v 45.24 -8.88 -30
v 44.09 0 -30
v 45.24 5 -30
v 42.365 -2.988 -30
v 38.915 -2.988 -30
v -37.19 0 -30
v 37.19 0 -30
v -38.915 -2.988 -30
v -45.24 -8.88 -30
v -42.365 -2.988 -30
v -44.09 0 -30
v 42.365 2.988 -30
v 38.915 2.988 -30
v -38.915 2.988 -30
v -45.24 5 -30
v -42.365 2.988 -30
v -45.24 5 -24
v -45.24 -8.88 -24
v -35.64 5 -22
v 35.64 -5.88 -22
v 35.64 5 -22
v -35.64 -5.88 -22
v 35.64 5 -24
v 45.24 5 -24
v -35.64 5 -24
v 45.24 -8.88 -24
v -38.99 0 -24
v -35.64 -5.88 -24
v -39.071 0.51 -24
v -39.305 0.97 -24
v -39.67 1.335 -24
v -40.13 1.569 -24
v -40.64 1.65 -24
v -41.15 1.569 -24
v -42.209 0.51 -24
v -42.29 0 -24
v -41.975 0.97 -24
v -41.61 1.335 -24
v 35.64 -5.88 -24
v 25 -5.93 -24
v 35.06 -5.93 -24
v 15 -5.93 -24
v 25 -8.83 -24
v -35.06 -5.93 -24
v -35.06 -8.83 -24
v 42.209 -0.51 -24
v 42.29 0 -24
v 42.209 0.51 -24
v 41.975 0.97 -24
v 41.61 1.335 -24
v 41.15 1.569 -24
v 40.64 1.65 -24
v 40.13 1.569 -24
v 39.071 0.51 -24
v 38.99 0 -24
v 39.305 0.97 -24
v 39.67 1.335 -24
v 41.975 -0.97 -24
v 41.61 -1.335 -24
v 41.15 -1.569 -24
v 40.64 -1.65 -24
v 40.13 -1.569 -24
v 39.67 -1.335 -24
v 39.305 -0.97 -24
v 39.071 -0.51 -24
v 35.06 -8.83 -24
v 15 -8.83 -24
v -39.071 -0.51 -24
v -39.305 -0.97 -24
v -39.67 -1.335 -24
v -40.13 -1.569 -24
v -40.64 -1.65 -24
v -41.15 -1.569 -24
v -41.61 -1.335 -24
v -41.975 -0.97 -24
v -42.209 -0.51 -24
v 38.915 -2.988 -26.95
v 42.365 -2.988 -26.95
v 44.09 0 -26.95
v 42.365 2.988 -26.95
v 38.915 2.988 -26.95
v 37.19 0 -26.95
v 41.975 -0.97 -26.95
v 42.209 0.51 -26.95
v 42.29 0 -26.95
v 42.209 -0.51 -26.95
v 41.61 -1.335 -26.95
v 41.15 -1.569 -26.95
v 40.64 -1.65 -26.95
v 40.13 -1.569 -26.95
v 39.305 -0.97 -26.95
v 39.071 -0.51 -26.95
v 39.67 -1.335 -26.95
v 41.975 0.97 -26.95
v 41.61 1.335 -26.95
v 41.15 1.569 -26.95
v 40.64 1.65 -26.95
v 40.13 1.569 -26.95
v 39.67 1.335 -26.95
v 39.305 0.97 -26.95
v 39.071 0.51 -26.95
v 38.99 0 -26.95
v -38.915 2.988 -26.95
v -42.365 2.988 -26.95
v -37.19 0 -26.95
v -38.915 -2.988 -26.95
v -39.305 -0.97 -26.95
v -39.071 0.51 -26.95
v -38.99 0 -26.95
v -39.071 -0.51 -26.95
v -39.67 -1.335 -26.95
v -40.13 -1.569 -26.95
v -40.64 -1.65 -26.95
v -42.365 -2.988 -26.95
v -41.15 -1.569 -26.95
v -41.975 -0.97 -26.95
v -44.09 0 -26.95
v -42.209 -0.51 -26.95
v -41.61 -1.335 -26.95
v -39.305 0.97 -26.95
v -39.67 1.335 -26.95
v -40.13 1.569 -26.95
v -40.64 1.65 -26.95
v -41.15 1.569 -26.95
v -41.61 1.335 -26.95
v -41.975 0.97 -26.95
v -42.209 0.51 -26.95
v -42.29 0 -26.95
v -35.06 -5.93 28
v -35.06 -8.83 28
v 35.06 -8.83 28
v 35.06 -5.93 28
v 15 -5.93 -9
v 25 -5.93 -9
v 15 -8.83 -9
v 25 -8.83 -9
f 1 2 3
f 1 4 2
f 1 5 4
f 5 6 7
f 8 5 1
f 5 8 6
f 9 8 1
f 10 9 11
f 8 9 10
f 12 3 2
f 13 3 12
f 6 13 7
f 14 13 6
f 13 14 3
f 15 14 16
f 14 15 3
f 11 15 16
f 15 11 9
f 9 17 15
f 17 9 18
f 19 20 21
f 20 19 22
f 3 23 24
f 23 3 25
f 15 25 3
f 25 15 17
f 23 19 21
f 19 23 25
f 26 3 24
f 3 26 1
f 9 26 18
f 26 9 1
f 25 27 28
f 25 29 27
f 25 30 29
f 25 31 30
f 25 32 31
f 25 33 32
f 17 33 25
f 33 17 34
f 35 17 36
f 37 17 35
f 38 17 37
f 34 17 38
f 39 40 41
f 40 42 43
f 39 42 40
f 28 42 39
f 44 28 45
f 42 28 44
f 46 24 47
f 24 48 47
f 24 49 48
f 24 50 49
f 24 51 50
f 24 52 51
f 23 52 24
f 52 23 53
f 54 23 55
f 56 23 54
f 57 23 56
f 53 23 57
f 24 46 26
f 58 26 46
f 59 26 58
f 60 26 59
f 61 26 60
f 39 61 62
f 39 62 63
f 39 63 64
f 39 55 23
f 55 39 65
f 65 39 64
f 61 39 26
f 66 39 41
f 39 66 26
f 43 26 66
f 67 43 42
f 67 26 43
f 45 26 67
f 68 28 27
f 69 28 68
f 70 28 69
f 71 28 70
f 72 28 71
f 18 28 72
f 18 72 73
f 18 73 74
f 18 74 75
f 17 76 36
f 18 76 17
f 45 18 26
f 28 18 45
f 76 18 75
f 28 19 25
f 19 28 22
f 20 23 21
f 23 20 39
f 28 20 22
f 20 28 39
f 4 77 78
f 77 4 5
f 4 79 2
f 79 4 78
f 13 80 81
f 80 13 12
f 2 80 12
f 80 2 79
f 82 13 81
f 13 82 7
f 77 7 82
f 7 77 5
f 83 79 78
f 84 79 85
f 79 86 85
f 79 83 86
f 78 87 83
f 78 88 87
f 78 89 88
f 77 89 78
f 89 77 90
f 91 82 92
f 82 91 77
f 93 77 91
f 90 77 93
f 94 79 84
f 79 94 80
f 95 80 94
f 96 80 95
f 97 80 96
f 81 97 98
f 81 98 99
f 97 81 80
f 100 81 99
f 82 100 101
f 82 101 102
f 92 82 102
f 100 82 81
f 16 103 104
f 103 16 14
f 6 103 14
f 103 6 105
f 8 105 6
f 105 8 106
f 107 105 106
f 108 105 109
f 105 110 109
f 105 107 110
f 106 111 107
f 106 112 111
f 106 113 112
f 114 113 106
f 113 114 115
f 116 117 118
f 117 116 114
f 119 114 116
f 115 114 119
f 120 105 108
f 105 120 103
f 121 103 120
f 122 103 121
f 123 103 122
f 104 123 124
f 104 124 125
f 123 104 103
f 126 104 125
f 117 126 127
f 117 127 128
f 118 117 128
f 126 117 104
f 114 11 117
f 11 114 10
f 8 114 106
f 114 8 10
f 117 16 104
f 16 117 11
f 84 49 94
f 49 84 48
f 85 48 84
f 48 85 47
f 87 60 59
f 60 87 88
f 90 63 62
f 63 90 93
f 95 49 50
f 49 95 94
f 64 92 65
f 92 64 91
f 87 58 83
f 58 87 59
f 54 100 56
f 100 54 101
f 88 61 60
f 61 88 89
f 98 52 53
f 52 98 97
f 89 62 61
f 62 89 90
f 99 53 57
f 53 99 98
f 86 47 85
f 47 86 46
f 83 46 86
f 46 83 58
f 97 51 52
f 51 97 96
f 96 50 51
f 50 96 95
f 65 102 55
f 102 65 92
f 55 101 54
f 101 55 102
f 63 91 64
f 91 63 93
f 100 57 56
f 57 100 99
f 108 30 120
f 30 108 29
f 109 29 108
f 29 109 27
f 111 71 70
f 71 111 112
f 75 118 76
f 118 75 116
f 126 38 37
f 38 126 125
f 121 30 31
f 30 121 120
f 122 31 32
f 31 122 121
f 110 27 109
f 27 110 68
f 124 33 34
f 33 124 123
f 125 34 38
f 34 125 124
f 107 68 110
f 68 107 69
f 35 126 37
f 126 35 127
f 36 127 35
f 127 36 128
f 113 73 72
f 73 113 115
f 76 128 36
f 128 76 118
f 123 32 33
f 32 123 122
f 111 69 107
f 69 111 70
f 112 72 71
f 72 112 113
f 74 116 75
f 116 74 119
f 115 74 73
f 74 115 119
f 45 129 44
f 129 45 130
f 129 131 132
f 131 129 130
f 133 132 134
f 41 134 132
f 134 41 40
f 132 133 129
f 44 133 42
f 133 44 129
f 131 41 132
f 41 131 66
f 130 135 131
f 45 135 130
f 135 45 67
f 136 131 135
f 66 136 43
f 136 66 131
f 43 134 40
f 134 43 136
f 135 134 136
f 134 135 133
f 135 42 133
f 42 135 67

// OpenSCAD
// file: configuration.scad
//ALBASE1115
//------------------------------------------------------------
///*
vzdalenost_der = 10.16; //rozteč děr mezi sebou
radidus_hrany = 5; //radius zaobleni sloupku

//parametry lišty
vzdalenost_od_okraje = 8.88; //vzdalenost stredu upevnovaci diry od kraje desky

//mala hrana
pocet_der1 = 8; //pocet der desky, ponížené o 3

//velka hrana
pocet_der2 = 8; //pocet der desky, ponížené o 3
//*/


//OBECNE PARAMETRY KRABICKY
//------------------------------------------------------------
vyska = 60;  //vyska celeho sloupku, pro zjisteni celkove vysky krabicky je potreba k teto vysce pricist tloustku 2xALBASE, nebo 2xPLBASE

//PLBASE PARAMETRY
//------------------------------------------------------------
tloustka_plbase = 2; //tloustka plbase
prekryti_der=0.3; //sila materiálu, který překrývá díry

//PRIPADNA VYSKA NOZICEK
//------------------------------------------------------------
vyska_nozicky=5;
// file: configuration/manufactury_conf.scad
$fn=20; // model faces resolution.

//Sloupek - vyrobni parametry
zapust=6; //zápust ve sloupku pro listu
tolerance=0.5; //tolerance mezi zapusti v sloupku  a v listě
zapust1=zapust+tolerance;

//Sroub - parametry
vyska_hlavy = 3.5;
prumer_hlavy=6;
prumer_sroubu=3.3;

//Matice - parametry
vyska_matky=3;
sirka_matky=6.7;

prumer_matice=6; //hrany k hraně
vyska_matice=3;  //vyska matice
posuv_dorazu=0;  //pro moznost posuvu dorazu pro vsunutí matice
matice_sila_materialu=2; //sila materialu pod maticí na ose z


//Lišta parametry
//---------------------------------------------------
//rozměry výrezu v ose y
vzdalenost_od_diry = 5; //vzdalenost od stredu upevnovaci diry na druhou stranu

//rozmery vyrezu v ose x
vzdalenost_1 = 4.6; //od díry ke kraji
vzdalenost_2 = 5;

vyska_listy=2; //definuje výšku žlábku do kterého se vsunuje čelíčko

//parametry pro úžlabinu
sirka_materialu = 0; //sirka materialu od kraje desky k uzlabine


//Celicko
//--------------------------------------------------
vule_vysky_celicka =0; //definuje vůli celicka v liste
vule_delky_celicka =1;
tloustka_celicka = 3;
vule_tlousky = 0.1;
// file: uravena_celicka.scad
use <configuration/celicko.scad>
use <configuration/sloupek.scad>
use <configuration/lista.scad>

include <configuration.scad>
include <configuration/manufactury_conf.scad>

//Slouzi pro vytvoreni vlastnich celicek dle potreby

//Vytvoreni predniho celicka krabicky
//--------------------------------------------------------
module celicko_predni()
{
translate([0,0,0])
difference() {
celicko (vyska,zapust,vule_vysky_celicka,pocet_der2,vzdalenost_der,vule_delky_celicka,tloustka_celicka,vule_tlousky,vyska_listy);
    
translate([20,0,0])
cube(size = [10,10,30], center = true);    
    
              }
}



//Vytvoreni zadniho celicka krabicky
//--------------------------------------------------------
module celicko_zadni()
{
translate([0,0,0])
difference() {
celicko (vyska,zapust,vule_vysky_celicka,pocet_der2,vzdalenost_der,vule_delky_celicka,tloustka_celicka,vule_tlousky,vyska_listy);
    
translate([20,0,0])    
cube(size = [10,10,30], center = true); 
}
}


//Vytvoreni leveho celicka krabicky
//--------------------------------------------------------
module celicko_leve()
{
translate([0,0,0])
difference() {
celicko (vyska,zapust,vule_vysky_celicka,pocet_der1,vzdalenost_der,vule_delky_celicka,tloustka_celicka,vule_tlousky,vyska_listy);
       
translate([20,0,0])    
cube(size = [10,10,30], center = true); 
}
}



//Vytvoreni praveho celicka krabicky
//--------------------------------------------------------
module celicko_prave()
{
translate([0,0,0])
difference() {
celicko (vyska,zapust,vule_vysky_celicka,pocet_der1,vzdalenost_der,vule_delky_celicka,tloustka_celicka,vule_tlousky,vyska_listy);
       
translate([20,0,0])    
cube(size = [10,10,30], center = true); 
}
}
barva_predni = "cyan";
barva_zadni = "red";
barva_leve = "green";
barva_prave = "yellow";

//Zobrazeni vzhledu navrhovanych celicek
color(barva_predni)
translate([0,-50,0]) 
celicko_predni();

color(barva_zadni)
translate([0,50,0])
rotate(a=[0,0,180])
celicko_zadni();

color(barva_leve)
translate([-60,0,0])
rotate(a=[0,0,270])
celicko_leve();

color(barva_prave)
translate([60,0,0])
rotate(a=[0,0,90])
celicko_prave();
// file: configuration/plbase.scad
/*
pocet_der1=5;
pocet_der2=3;
radidus_hrany=5;
vzdalenost_der=10.16;
vzdalenost_od_okraje=8.8;
prumer_sroubu=3.3;

tloustka_plbase=2;
prekryti_der=0.3;

vyska_nozicky=5;

vyska_hlavy = 3.5;
prumer_hlavy=6;
*/

//PLBASE ZAKLADNI
//------------------------------------------------------------
module plbase(pocet_der1,pocet_der2,radidus_hrany,vzdalenost_der,vzdalenost_od_okraje,prumer_sroubu,tloustka_plbase,prekryti_der){

difference () {
//union () {
translate([radidus_hrany,radidus_hrany,0])
minkowski()
    {
	cube([(pocet_der1-1)*vzdalenost_der+2*vzdalenost_od_okraje-2*radidus_hrany,(pocet_der2-1)*vzdalenost_der+2*vzdalenost_od_okraje-2*radidus_hrany,tloustka_plbase]);          // base plastics brick
        cylinder(r=radidus_hrany,h=0.1);
    }
    

for (i = [0:1:pocet_der1-1]) {
      for (a = [0:1:pocet_der2-1]) {  
          
    translate([vzdalenost_od_okraje+vzdalenost_der*i,vzdalenost_od_okraje+vzdalenost_der*a, (tloustka_plbase-prekryti_der)/2])  // center top screw
        cylinder(((tloustka_plbase-prekryti_der)), d=prumer_sroubu, center=true); 
      }
      }
 
translate([vzdalenost_od_okraje,vzdalenost_od_okraje, (tloustka_plbase/2)])  // center top screw
        cylinder(((tloustka_plbase+0.3)), d=prumer_sroubu, center=true);  
      
translate([vzdalenost_od_okraje+(pocet_der1-1)*vzdalenost_der,vzdalenost_od_okraje, (tloustka_plbase/2)])  // center top screw
        cylinder(((tloustka_plbase+0.3)), d=prumer_sroubu, center=true);  

translate([vzdalenost_od_okraje+(pocet_der1-1)*vzdalenost_der,vzdalenost_od_okraje+(pocet_der2-1)*vzdalenost_der, (tloustka_plbase/2)])  // center top screw
        cylinder(((tloustka_plbase+0.3)), d=prumer_sroubu, center=true); 
      
translate([vzdalenost_od_okraje,vzdalenost_od_okraje+(pocet_der2-1)*vzdalenost_der, (tloustka_plbase/2)])  // center top screw
        cylinder(((tloustka_plbase+0.3)), d=prumer_sroubu, center=true);       
      
}
}



//MODEL NOZICKY PRO PLBASE
//-----------------------------------------------------------
//průmer nozicky je roven vzdalenost_der
module nozicka (vzdalenost_der,vyska_nozicky,prumer_sroubu,vyska_hlavy,prumer_hlavy)
{
    difference () {
translate([0,0,-vyska_nozicky/2]) 
cylinder((vyska_nozicky), d=vzdalenost_der, center=true); 
translate([0,0,-(vyska_nozicky-vyska_hlavy/2)])       
cylinder((vyska_hlavy), d=prumer_hlavy, center=true); 
translate([0,0,-vyska_nozicky/2]) 
cylinder((vyska_nozicky), d=prumer_sroubu, center=true);       
}
}



//PLBASE S NOZICKAMA
//-----------------------------------------------------------
module plbase_s_nozickama(pocet_der1,pocet_der2,radidus_hrany,vzdalenost_der,vzdalenost_od_okraje,prumer_sroubu,tloustka_plbase,prekryti_der,vyska_nozicky,vyska_hlavy,prumer_hlavy){
    
 plbase(pocet_der1,pocet_der2,radidus_hrany,vzdalenost_der,vzdalenost_od_okraje,prumer_sroubu,tloustka_plbase,prekryti_der); 
  
translate([vzdalenost_od_okraje,vzdalenost_od_okraje, (tloustka_plbase)])  // center top screw
    rotate(a=[180,0,0])
        nozicka (vzdalenost_der,vyska_nozicky,prumer_sroubu,vyska_hlavy,prumer_hlavy);   
      
translate([vzdalenost_od_okraje+(pocet_der1-1)*vzdalenost_der,vzdalenost_od_okraje, tloustka_plbase])  // center top screw
    rotate(a=[180,0,0])
      nozicka (vzdalenost_der,vyska_nozicky,prumer_sroubu,vyska_hlavy,prumer_hlavy);  

translate([vzdalenost_od_okraje+(pocet_der1-1)*vzdalenost_der,vzdalenost_od_okraje+(pocet_der2-1)*vzdalenost_der, (tloustka_plbase)])  // center top screw
    rotate(a=[180,0,0])
   nozicka (vzdalenost_der,vyska_nozicky,prumer_sroubu,vyska_hlavy,prumer_hlavy);  
      
translate([vzdalenost_od_okraje,vzdalenost_od_okraje+(pocet_der2-1)*vzdalenost_der, (tloustka_plbase)])  // center top screw
    rotate(a=[180,0,0])
    nozicka (vzdalenost_der,vyska_nozicky,prumer_sroubu,vyska_hlavy,prumer_hlavy);          
 
    
    }
    
    

//PLBASE SE ZAPUSTENIM SROUBU
//------------------------------------------------------
module plbase_zapustene_srouby(pocet_der1,pocet_der2,radidus_hrany,vzdalenost_der,vzdalenost_od_okraje,prumer_sroubu,vyska_hlavy,prekryti_der,prumer_hlavy){
difference () {    
 plbase(pocet_der1,pocet_der2,radidus_hrany,vzdalenost_der,vzdalenost_od_okraje,prumer_sroubu,(vyska_hlavy+1.5),prekryti_der);   

translate([vzdalenost_od_okraje,vzdalenost_od_okraje, 1.5+(vyska_hlavy/2)])  // center top screw
        cylinder(((vyska_hlavy+0.5)), d=prumer_hlavy, center=true);  
      
translate([vzdalenost_od_okraje+(pocet_der1-1)*vzdalenost_der,vzdalenost_od_okraje, 1.5+(vyska_hlavy/2)])  // center top screw
        cylinder(((vyska_hlavy+0.5)), d=prumer_hlavy, center=true);  

translate([vzdalenost_od_okraje+(pocet_der1-1)*vzdalenost_der,vzdalenost_od_okraje+(pocet_der2-1)*vzdalenost_der, 1.5+(vyska_hlavy/2)])  // center top screw
        cylinder(((vyska_hlavy+0.5)), d=prumer_hlavy, center=true); 
      
translate([vzdalenost_od_okraje,vzdalenost_od_okraje+(pocet_der2-1)*vzdalenost_der, 1.5+(vyska_hlavy/2)])  // center top screw
        cylinder(((vyska_hlavy+0.5)), d=prumer_hlavy, center=true);   

}
}
/*
plbase_zapustene_srouby(pocet_der1,pocet_der2,radidus_hrany,vzdalenost_der,vzdalenost_od_okraje,prumer_sroubu,vyska_hlavy,prekryti_der,prumer_hlavy);

nozicka (vzdalenost_der,vyska_nozicky,prumer_sroubu,vyska_hlavy,prumer_hlavy);
// file: configuration/lista.scad
//Funkce generujici listu
module lista (vzdalenost_der,pocet_der,vzdalenost_od_okraje,vzdalenost_od_diry,vzdalenost_1,vzdalenost_2, zapust,vyska_listy,tlouska_celicka,sirka_materialu,vyska_hlavy,prumer_hlavy,prumer_sroubu,prumer_matice,vyska_matice,posuv_dorazu,matice_sila_materialu,vyska_matky,sirka_matky) {
    
difference () {
color("cyan")
    translate([0, 0, 0])
        linear_extrude(height = zapust+vyska_listy)
            square([((pocet_der*vzdalenost_der)+2*vzdalenost_1), vzdalenost_od_okraje+vzdalenost_od_diry], center = true); 
    
    translate([-((((pocet_der*vzdalenost_der)+2*vzdalenost_1)/2)-(vzdalenost_1+vzdalenost_2/2)), 0, (zapust)])
        linear_extrude(height = vyska_listy)
            square([vzdalenost_2, vzdalenost_od_okraje+vzdalenost_od_diry], center = true); 
    
    translate([((((pocet_der*vzdalenost_der)+2*vzdalenost_1)/2)-(vzdalenost_1+vzdalenost_2/2)), 0, (zapust)])
        linear_extrude(height = vyska_listy)
            square([vzdalenost_2, vzdalenost_od_okraje+vzdalenost_od_diry], center = true); 
    
    translate([-((((pocet_der*vzdalenost_der)+2*vzdalenost_1)/2)-(vzdalenost_1/2)), 0, (zapust)])
        linear_extrude(height = vyska_listy)
            square([vzdalenost_1, vzdalenost_od_okraje+vzdalenost_od_diry], center = true); 
    
    translate([((((pocet_der*vzdalenost_der)+2*vzdalenost_1)/2)-(vzdalenost_1/2)), 0, (zapust)])
        linear_extrude(height = vyska_listy)
            square([vzdalenost_1, vzdalenost_od_okraje+vzdalenost_od_diry], center = true); 
    
     translate([0,-((((vzdalenost_od_okraje+vzdalenost_od_diry)/2)-sirka_materialu)-(tlouska_celicka/2)), zapust])
        linear_extrude(height = vyska_listy)
            square([((pocet_der*vzdalenost_der)+2*vzdalenost_1), tlouska_celicka], center = true); 
   
    
//otvory pro matky
//--------------------------------------------------------------
    
    translate([vzdalenost_der*pocet_der/2,-(((vzdalenost_od_okraje+vzdalenost_od_diry)/2)-vzdalenost_od_okraje),vyska_matky/2])  // center top screw
         cylinder (h = vyska_matky+0.1, r= (sirka_matky+0.2)/2, center=true, $fn=6);
        
        
     translate([-vzdalenost_der*pocet_der/2,-(((vzdalenost_od_okraje+vzdalenost_od_diry)/2)-vzdalenost_od_okraje),vyska_matky/2])  // center top screw
        cylinder (h = vyska_matky+0.1, r= (sirka_matky+0.2)/2, center=true, $fn=6);
        
        
 
//otvory pro srouby
//--------------------------------------------------------------

translate([vzdalenost_der*pocet_der/2,-(((vzdalenost_od_okraje+vzdalenost_od_diry)/2)-vzdalenost_od_okraje),vyska_hlavy/2])  // center top screw
        cylinder((2*(zapust+vyska_listy)), d=prumer_sroubu, center=true); 
        
     translate([-vzdalenost_der*pocet_der/2,-(((vzdalenost_od_okraje+vzdalenost_od_diry)/2)-vzdalenost_od_okraje),vyska_hlavy/2])  // center top screw
        cylinder((2*(zapust+vyska_listy)), d=prumer_sroubu, center=true); 



//otvory pro srouby po cele delce
/*
 for (i = [0:1:pocet_der]) {      
 translate([(-i*vzdalenost_der)+vzdalenost_der*pocet_der/2,-(((vzdalenost_od_okraje+vzdalenost_od_diry)/2)-vzdalenost_od_okraje),(zapust-vyska_hlavy)+vyska_hlavy/2])  // center top screw
        cylinder((2*(zapust+vyska_listy)), d=prumer_sroubu, center=true); 
      }
*/      

      
//otvory pro matice
//--------------------------------------------------------------
/*     
 for (i = [1:1:(pocet_der-1)]) {      
 translate([(-i*vzdalenost_der)+vzdalenost_der*pocet_der/2,-((((vzdalenost_od_okraje+vzdalenost_od_diry)/2)-vzdalenost_od_okraje)-((((prumer_matice+posuv_dorazu+vzdalenost_od_diry)/2))-(prumer_matice+posuv_dorazu)/2)),matice_sila_materialu])  // center top screw
      cube([prumer_matice, prumer_matice+posuv_dorazu+vzdalenost_od_diry,vyska_matice], center = true);
  
     }
*/
     
     }    
        } 
        
 //lista (vzdalenost_der,pocet_der1,vzdalenost_od_okraje,vzdalenost_od_diry,vzdalenost_1,vzdalenost_2, zapust,vyska_listy,tloustka_celicka,sirka_materialu,vyska_hlavy,prumer_hlavy,prumer_sroubu,prumer_matice,vyska_matice,posuv_dorazu,matice_sila_materialu);
 
// file: configuration/sloupek.scad
include <manufactury_conf.scad>
include <../configuration.scad>
use <MLAB_logo.scad>

//Funkce pro generovani sloupku
module sloupek(
    vyska,
    zapust,
    vzdalenost_der,
    vzdalenost_od_okraje,
    vzdalenost_od_diry,
    radidus_hrany,
    prumer_sroubu,
    prumer_matice,
    vyska_matice,
    posuv_dorazu,
   matice_sila_materialu,logo_vyska,logo_sirka) {

    difference () {
        union () {
            color("green")
                translate([-(vzdalenost_od_okraje-radidus_hrany),-(vzdalenost_od_okraje-radidus_hrany),0])  // center top screw
                    cylinder(vyska, d=(2*radidus_hrany), center=true);

            color("cyan")
                translate([vzdalenost_der/4, vzdalenost_der/4, -vyska/2])
                    linear_extrude(height = vyska)
                        square([vzdalenost_der/2, vzdalenost_der/2], center = true);    

            color("gray")
                translate([-vzdalenost_od_okraje/2, vzdalenost_der/4, -vyska/2])
                    linear_extrude(height = vyska)
                        square([(vzdalenost_od_okraje), vzdalenost_der/2], center = true);  
                
            color("gray")
                translate([vzdalenost_der/4, -vzdalenost_od_okraje/2, -vyska/2])
                    linear_extrude(height = vyska)
                        square([vzdalenost_der/2, vzdalenost_od_okraje], center = true); 
                
            color("red")
                translate([-(vzdalenost_od_okraje-radidus_hrany)/2, -vzdalenost_od_okraje/2, -vyska/2])
                    linear_extrude(height = vyska)
                        square([vzdalenost_od_okraje-radidus_hrany, vzdalenost_od_okraje], center = true); 
               
            color("red")
                translate([-vzdalenost_od_okraje/2,-(vzdalenost_od_okraje-radidus_hrany)/2, -vyska/2])
                    linear_extrude(height = vyska)
                        square([vzdalenost_od_okraje, vzdalenost_od_okraje-radidus_hrany], center = true); 

            color("green")
                translate([vzdalenost_der, -vzdalenost_od_okraje/2, -(vyska-(2*zapust))/2])
                    linear_extrude(height = (vyska-(2*zapust)))
                        square([vzdalenost_der, vzdalenost_od_okraje], center = true); 
                        
            color("red")
                translate([-vzdalenost_od_okraje/2,vzdalenost_der, -(vyska-(2*zapust))/2])
                    linear_extrude(height = (vyska-(2*zapust)))
                        square([ vzdalenost_od_okraje,vzdalenost_der], center = true);             
              
             color("cyan")
                translate([vzdalenost_od_diry/2, vzdalenost_der, -(vyska-(2*zapust))/2])
                    linear_extrude(height = (vyska-(2*zapust)))
                        square([(vzdalenost_od_diry), vzdalenost_der], center = true);  
              
             color("cyan")
                translate([vzdalenost_der, vzdalenost_od_diry/2, -(vyska-(2*zapust))/2])
                    linear_extrude(height = (vyska-(2*zapust)))
                        square([vzdalenost_der, vzdalenost_od_diry ], center = true);                
       

        
        
        }

        //diry na sroub
            translate([0,0,0])  // center top screw
                cylinder(2*vyska, d=(prumer_sroubu), center=true);

            translate([vzdalenost_der,0,0])  // center top screw
                cylinder(2*vyska, d=(prumer_sroubu), center=true);

            translate([0,vzdalenost_der,0])  // center top screw
                cylinder(2*vyska, d=(prumer_sroubu), center=true);

        //diry na matice
        //1. krajni matice
        translate([vzdalenost_der,(((((prumer_matice)/2)+posuv_dorazu+vzdalenost_od_diry)/2)-(posuv_dorazu+prumer_matice/2)),((vyska-2*zapust)/2-vyska_matice/2)-matice_sila_materialu])  // center top screw
              
        cube([prumer_matice, prumer_matice+posuv_dorazu+vzdalenost_od_diry,vyska_matice], center = true);

        translate([vzdalenost_der,(((((prumer_matice)/2)+posuv_dorazu+vzdalenost_od_diry)/2)-(posuv_dorazu+prumer_matice/2)),-(((vyska-2*zapust)/2-vyska_matice/2)-matice_sila_materialu)])  // center top screw
              
        cube([prumer_matice, prumer_matice+posuv_dorazu+vzdalenost_od_diry,vyska_matice], center = true);


        //2. krajni matice
        translate([(((((prumer_matice)/2)+posuv_dorazu+vzdalenost_od_diry)/2)-(posuv_dorazu+prumer_matice/2)), vzdalenost_der,((vyska-2*zapust)/2-vyska_matice/2)-matice_sila_materialu])  // center top screw
              
        cube([ prumer_matice+posuv_dorazu+vzdalenost_od_diry,prumer_matice,vyska_matice], center = true);

        translate([(((((prumer_matice)/2)+posuv_dorazu+vzdalenost_od_diry)/2)-(posuv_dorazu+prumer_matice/2)), vzdalenost_der,-(((vyska-2*zapust)/2-vyska_matice/2)-matice_sila_materialu)])  // center top screw
              
        cube([ prumer_matice+posuv_dorazu+vzdalenost_od_diry,prumer_matice,vyska_matice], center = true);

        //prostredni dira
        translate([0,(((((prumer_matice)/2)+posuv_dorazu+vzdalenost_od_diry)/2)-(posuv_dorazu+prumer_matice/2)),((vyska)/2-vyska_matice/2)-matice_sila_materialu])  // center top screw
              
        cube([prumer_matice, prumer_matice+posuv_dorazu+vzdalenost_od_diry,vyska_matice], center = true);

        translate([0,(((((prumer_matice)/2)+posuv_dorazu+vzdalenost_od_diry)/2)-(posuv_dorazu+prumer_matice/2)),-(((vyska)/2-vyska_matice/2)-matice_sila_materialu)])  // center top screw
              
        cube([prumer_matice, prumer_matice+posuv_dorazu+vzdalenost_od_diry,vyska_matice], center = true);

//----------------------------------------------------
//LOGO MLAB 
        union (){
            translate ([-vzdalenost_od_okraje+1,5, 0])  // ODROIDs passive components hole.
                rotate([0, 90, 180])
                    scale(v = [logo_sirka, logo_vyska, 0.3])
                        MLAB_logo_short();
                }  

       }
}

/*sloupek(
    vyska,
    zapust,
    vzdalenost_der,
    vzdalenost_od_okraje,
    vzdalenost_od_diry,
    radidus_hrany,
    prumer_sroubu,
    prumer_matice,
    vyska_matice,
    posuv_dorazu,
   matice_sila_materialu);
// file: configuration/celicko.scad
//Funkce generujici plne celicko
module celicko (vyska,zapust,vule_vysky_celicka,pocet_der,vzdalenost_der,vule_delky_celicka,tloustka_celicka,vule_tlousky,vyska_listy) {
    difference () {
        color("cyan")
            translate([0, 0, 0])
                linear_extrude(height = vyska-2*zapust-vule_vysky_celicka+2*vyska_listy)
                    square([(pocet_der-1)*vzdalenost_der-vule_delky_celicka, tloustka_celicka-vule_tlousky], center = true);         
    }
}
// main file
use <configuration/celicko.scad>
use <configuration/sloupek.scad>
use <configuration/lista.scad>
use <configuration/plbase.scad>
use <uravena_celicka.scad>


include <configuration/manufactury_conf.scad>
include <configuration.scad>



barva_sloupku = "cyan";
barva_listy = "red";
barva_celicka = "green";
barva_plbase = "yellow";


//VELKE LISTY - podstavec drzaku
//--------------------------------------------------------
//lista velka 1
color(barva_listy)
translate([0,-(((vzdalenost_od_diry+vzdalenost_od_okraje)/2)-vzdalenost_od_diry),-vyska/2])
rotate(a=[0,0,0])
lista (vzdalenost_der,pocet_der2,vzdalenost_od_okraje,vzdalenost_od_diry,vzdalenost_1,vzdalenost_2, zapust,vyska_listy,tloustka_celicka,sirka_materialu,vyska_hlavy,prumer_hlavy,prumer_sroubu,prumer_matice,vyska_matice,posuv_dorazu,matice_sila_materialu,vyska_matky,sirka_matky);


//CELICKA - drzak LCD
//--------------------------------------------------------
//celicko predni

color(barva_celicka)
translate([0,-(((vzdalenost_od_diry+vzdalenost_od_okraje)/2)-vzdalenost_od_diry)-((((vzdalenost_od_okraje+vzdalenost_od_diry)/2)-sirka_materialu)-(tloustka_celicka/2)),-(vyska-2*zapust-vule_vysky_celicka)/2])
celicko_predni (vyska,zapust,vule_vysky_celicka,pocet_der2,vzdalenost_der,vule_delky_celicka,tloustka_celicka,vule_tlousky);



//PLBASE SPODNI
//-------------------------------------------------------------
//color(barva_plbase)
//základní plbase bez nožiček
/*
translate([-((pocet_der2+2)*vzdalenost_der+2*vzdalenost_od_okraje)/2,-vzdalenost_od_okraje,-(vyska/2)])
rotate(a=[180,0,90])


plbase(pocet_der1+3,pocet_der2+3,radidus_hrany,vzdalenost_der,vzdalenost_od_okraje,prumer_sroubu,tloustka_plbase,prekryti_der);
*/

//plbase s nožičkama
/*
translate([-((pocet_der2+2)*vzdalenost_der+2*vzdalenost_od_okraje)/2,-vzdalenost_od_okraje,-((vyska/2))])
rotate(a=[180,0,90])
plbase_s_nozickama(pocet_der1+3,pocet_der2+3,radidus_hrany,vzdalenost_der,vzdalenost_od_okraje,prumer_sroubu,tloustka_plbase,prekryti_der,vyska_nozicky,vyska_hlavy,prumer_hlavy);
//*/

//plbase se zápustnými šrouby
/*
translate([-((pocet_der2+2)*vzdalenost_der+2*vzdalenost_od_okraje)/2,-vzdalenost_od_okraje,-(vyska/2)])
rotate(a=[180,0,90])

plbase_zapustene_srouby(pocet_der1+3,pocet_der2+3,radidus_hrany,vzdalenost_der,vzdalenost_od_okraje,prumer_sroubu,vyska_hlavy,prekryti_der,prumer_hlavy);
*/
